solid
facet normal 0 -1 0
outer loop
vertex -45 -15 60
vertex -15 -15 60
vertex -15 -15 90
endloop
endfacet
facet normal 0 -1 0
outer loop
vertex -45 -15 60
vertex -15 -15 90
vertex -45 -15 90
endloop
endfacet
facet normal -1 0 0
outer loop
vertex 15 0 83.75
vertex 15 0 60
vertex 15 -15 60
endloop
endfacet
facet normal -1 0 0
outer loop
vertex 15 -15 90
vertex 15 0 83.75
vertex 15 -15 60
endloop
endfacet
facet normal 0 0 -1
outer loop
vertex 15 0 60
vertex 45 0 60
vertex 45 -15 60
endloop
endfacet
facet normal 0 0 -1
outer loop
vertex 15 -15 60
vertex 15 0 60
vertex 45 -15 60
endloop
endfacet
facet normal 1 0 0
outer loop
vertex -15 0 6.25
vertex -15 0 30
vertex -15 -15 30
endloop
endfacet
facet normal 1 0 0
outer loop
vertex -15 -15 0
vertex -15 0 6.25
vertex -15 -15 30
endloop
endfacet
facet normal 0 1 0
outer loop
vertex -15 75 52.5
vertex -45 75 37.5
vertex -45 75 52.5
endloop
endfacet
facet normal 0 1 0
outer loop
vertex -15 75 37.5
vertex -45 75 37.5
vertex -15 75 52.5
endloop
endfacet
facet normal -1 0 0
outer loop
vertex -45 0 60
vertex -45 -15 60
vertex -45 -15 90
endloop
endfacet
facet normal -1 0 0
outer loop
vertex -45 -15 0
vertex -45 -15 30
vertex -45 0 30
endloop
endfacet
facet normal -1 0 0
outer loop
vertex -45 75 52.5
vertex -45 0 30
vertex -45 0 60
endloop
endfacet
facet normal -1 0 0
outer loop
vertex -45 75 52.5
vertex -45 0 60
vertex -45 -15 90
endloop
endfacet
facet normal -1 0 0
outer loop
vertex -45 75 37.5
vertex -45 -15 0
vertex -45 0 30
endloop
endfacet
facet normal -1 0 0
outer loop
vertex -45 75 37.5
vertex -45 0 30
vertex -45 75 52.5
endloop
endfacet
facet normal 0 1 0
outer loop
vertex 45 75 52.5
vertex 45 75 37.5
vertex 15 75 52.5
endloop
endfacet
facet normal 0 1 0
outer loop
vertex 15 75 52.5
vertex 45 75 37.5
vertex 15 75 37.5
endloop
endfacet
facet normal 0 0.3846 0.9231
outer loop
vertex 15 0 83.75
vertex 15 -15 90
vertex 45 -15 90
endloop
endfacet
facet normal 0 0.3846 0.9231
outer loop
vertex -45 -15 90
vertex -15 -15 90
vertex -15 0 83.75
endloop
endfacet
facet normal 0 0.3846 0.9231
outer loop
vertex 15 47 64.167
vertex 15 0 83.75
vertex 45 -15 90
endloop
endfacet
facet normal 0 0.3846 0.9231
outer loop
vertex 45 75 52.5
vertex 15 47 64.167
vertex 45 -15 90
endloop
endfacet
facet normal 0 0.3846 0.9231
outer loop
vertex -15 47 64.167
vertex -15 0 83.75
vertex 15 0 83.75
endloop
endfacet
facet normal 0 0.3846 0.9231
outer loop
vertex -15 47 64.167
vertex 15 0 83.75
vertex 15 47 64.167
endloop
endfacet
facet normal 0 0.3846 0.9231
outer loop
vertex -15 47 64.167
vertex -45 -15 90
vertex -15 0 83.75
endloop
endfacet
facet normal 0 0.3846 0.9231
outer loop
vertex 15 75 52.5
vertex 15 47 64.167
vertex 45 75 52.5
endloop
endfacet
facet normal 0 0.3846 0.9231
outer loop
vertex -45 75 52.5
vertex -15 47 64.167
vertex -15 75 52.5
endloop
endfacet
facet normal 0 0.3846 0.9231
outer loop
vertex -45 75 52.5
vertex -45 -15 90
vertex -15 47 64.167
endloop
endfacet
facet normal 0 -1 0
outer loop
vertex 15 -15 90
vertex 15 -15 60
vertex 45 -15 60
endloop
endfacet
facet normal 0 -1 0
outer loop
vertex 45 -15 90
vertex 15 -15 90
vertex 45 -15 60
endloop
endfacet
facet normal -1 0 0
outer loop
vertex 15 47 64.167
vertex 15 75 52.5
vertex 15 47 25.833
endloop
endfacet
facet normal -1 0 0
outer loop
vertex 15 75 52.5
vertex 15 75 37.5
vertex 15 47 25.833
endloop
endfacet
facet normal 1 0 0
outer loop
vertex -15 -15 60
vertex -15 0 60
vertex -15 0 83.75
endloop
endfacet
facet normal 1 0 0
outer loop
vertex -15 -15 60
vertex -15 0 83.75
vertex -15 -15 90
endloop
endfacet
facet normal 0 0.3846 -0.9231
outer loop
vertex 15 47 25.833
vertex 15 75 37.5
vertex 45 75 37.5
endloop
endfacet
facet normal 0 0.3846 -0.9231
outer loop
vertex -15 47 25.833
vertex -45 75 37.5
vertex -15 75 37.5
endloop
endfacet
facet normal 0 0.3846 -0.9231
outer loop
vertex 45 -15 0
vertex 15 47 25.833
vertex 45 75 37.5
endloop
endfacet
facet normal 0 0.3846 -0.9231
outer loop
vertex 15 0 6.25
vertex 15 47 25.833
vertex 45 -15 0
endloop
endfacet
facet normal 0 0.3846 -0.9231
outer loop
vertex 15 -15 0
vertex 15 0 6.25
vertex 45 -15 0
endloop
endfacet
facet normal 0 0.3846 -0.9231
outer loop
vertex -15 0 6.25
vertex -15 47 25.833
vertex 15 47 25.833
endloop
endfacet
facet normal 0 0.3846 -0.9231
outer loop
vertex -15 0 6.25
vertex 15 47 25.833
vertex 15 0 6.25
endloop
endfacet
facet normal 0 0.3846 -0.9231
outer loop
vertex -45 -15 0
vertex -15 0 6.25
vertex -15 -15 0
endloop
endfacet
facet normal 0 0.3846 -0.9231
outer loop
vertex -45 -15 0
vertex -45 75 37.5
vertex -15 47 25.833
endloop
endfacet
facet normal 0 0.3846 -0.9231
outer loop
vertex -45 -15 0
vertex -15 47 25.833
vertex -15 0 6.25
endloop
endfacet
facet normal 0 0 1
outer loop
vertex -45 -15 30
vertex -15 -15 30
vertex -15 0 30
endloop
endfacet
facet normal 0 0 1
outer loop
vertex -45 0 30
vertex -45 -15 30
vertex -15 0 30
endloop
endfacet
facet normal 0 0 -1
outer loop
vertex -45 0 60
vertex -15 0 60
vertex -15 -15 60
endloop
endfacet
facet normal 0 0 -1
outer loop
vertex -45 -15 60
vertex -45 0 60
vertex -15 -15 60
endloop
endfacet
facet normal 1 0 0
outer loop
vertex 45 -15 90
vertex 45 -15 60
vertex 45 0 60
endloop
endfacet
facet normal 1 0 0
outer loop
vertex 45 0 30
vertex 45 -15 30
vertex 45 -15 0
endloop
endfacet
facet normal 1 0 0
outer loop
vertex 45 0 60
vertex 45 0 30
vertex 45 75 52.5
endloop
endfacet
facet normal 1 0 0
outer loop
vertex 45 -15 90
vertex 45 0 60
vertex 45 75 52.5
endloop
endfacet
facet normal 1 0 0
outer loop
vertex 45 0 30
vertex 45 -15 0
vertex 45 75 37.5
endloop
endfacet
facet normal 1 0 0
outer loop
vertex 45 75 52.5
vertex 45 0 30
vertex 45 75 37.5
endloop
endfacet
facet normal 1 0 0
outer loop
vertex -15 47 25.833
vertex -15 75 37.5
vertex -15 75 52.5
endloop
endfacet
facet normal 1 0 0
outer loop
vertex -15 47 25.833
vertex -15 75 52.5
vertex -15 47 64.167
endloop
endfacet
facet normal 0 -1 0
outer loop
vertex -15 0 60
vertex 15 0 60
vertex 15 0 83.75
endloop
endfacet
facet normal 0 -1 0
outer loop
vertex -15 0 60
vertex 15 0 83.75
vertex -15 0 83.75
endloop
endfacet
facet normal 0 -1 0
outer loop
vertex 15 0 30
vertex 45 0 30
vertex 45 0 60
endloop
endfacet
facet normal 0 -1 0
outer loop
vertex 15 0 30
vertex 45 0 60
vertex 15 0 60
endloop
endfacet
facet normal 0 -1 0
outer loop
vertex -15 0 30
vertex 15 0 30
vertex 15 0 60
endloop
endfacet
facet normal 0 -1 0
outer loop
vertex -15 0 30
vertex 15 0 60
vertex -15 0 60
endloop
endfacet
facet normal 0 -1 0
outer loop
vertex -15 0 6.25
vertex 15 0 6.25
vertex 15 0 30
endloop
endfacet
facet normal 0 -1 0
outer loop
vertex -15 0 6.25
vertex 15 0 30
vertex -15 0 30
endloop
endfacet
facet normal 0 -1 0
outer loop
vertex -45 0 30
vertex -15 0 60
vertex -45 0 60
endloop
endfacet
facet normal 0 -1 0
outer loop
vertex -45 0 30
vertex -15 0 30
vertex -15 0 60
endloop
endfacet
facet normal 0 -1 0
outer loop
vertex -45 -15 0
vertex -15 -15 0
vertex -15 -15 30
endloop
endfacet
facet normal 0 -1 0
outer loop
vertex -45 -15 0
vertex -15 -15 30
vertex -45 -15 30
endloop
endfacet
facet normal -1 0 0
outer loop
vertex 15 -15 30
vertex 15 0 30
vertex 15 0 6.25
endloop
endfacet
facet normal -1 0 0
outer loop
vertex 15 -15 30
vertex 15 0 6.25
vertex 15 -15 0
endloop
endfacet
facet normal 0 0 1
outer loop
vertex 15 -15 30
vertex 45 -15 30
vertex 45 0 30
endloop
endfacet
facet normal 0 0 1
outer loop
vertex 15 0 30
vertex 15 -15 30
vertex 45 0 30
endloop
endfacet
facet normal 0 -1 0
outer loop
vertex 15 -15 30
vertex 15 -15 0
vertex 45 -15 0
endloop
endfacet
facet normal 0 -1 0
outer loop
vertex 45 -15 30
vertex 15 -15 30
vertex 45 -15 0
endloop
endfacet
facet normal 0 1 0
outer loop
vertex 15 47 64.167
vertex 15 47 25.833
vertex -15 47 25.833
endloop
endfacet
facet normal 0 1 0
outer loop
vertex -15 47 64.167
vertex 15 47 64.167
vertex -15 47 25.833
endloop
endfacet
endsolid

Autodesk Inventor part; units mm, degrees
ref_plane "YZ Plane" through (0, 0, 0) normal (1, 0, 0) x (0, 1, 0)
ref_plane "XZ Plane" through (0, 0, 0) normal (0, 1, 0) x (-1, 0, 0)
ref_plane "XY Plane" through (0, 0, 0) normal (0, 0, 1) x (1, 0, 0)
sketch "Sketch1" plane through (0, 0, 0) normal (0, 0, 1) x (1, 0, 0)
  line L0 (0, 0) -> (15, 0)
  line L1 (15, 0) -> (15, -15)
  line L2 (15, -15) -> (45, -15)
  line L3 (45, -15) -> (45, 75)
  line L4 (45, 75) -> (15, 75)
  line L5 (15, 75) -> (15, 47)
  line L6 (15, 47) -> (0, 47)
  line L7 (0, 0) -> (0, 47) construction
  line L8 (0, 0) -> (-15, 0)
  line L9 (-15, 0) -> (-15, -15)
  line L10 (-15, -15) -> (-45, -15)
  line L11 (-45, -15) -> (-45, 75)
  line L12 (-45, 75) -> (-15, 75)
  line L13 (-15, 75) -> (-15, 47)
  line L14 (-15, 47) -> (0, 47)
  dimension "d0" = 47
  dimension "d1" = 28
  dimension "d2" = 30
  dimension "d3" = 15
  dimension "d4" = 90
extrude "Extrusion1" add sketch "Sketch1" along normal blind 90
sketch "Sketch2" plane through (-45, -15, 0) normal (-1, 0, 0) x (0, 0, 1)
  line L0 (0, 90) -> (0, 0) projected
  line L1 (0, 0) -> (90, 0) projected
  line L2 (90, 90) -> (90, 0) projected
  line L3 (0, 90) -> (90, 90) projected
  line L4 (90, 15) -> (90, 0) projected
  line L5 (90, 0) -> (52.5, 90)
  line L6 (0, 90) -> (90, 90) projected
  line L7 (37.5, 90) -> (0, 0)
  line L8 (30, 0) -> (30, 15)
  line L9 (30, 15) -> (60, 15)
  line L10 (60, 15) -> (60, 0)
  point P0 (0, 15)
  point P1 (45, 15)
  point P2 (45, 0)
  dimension "d12" = 30
  dimension "d13" = 15
extrude "Extrusion2" cut sketch "Sketch2" against normal blind 90 contours L3 L7 L0 | L8 L9 L10 L1 | L3 L2 L5
properties part number "b4"
